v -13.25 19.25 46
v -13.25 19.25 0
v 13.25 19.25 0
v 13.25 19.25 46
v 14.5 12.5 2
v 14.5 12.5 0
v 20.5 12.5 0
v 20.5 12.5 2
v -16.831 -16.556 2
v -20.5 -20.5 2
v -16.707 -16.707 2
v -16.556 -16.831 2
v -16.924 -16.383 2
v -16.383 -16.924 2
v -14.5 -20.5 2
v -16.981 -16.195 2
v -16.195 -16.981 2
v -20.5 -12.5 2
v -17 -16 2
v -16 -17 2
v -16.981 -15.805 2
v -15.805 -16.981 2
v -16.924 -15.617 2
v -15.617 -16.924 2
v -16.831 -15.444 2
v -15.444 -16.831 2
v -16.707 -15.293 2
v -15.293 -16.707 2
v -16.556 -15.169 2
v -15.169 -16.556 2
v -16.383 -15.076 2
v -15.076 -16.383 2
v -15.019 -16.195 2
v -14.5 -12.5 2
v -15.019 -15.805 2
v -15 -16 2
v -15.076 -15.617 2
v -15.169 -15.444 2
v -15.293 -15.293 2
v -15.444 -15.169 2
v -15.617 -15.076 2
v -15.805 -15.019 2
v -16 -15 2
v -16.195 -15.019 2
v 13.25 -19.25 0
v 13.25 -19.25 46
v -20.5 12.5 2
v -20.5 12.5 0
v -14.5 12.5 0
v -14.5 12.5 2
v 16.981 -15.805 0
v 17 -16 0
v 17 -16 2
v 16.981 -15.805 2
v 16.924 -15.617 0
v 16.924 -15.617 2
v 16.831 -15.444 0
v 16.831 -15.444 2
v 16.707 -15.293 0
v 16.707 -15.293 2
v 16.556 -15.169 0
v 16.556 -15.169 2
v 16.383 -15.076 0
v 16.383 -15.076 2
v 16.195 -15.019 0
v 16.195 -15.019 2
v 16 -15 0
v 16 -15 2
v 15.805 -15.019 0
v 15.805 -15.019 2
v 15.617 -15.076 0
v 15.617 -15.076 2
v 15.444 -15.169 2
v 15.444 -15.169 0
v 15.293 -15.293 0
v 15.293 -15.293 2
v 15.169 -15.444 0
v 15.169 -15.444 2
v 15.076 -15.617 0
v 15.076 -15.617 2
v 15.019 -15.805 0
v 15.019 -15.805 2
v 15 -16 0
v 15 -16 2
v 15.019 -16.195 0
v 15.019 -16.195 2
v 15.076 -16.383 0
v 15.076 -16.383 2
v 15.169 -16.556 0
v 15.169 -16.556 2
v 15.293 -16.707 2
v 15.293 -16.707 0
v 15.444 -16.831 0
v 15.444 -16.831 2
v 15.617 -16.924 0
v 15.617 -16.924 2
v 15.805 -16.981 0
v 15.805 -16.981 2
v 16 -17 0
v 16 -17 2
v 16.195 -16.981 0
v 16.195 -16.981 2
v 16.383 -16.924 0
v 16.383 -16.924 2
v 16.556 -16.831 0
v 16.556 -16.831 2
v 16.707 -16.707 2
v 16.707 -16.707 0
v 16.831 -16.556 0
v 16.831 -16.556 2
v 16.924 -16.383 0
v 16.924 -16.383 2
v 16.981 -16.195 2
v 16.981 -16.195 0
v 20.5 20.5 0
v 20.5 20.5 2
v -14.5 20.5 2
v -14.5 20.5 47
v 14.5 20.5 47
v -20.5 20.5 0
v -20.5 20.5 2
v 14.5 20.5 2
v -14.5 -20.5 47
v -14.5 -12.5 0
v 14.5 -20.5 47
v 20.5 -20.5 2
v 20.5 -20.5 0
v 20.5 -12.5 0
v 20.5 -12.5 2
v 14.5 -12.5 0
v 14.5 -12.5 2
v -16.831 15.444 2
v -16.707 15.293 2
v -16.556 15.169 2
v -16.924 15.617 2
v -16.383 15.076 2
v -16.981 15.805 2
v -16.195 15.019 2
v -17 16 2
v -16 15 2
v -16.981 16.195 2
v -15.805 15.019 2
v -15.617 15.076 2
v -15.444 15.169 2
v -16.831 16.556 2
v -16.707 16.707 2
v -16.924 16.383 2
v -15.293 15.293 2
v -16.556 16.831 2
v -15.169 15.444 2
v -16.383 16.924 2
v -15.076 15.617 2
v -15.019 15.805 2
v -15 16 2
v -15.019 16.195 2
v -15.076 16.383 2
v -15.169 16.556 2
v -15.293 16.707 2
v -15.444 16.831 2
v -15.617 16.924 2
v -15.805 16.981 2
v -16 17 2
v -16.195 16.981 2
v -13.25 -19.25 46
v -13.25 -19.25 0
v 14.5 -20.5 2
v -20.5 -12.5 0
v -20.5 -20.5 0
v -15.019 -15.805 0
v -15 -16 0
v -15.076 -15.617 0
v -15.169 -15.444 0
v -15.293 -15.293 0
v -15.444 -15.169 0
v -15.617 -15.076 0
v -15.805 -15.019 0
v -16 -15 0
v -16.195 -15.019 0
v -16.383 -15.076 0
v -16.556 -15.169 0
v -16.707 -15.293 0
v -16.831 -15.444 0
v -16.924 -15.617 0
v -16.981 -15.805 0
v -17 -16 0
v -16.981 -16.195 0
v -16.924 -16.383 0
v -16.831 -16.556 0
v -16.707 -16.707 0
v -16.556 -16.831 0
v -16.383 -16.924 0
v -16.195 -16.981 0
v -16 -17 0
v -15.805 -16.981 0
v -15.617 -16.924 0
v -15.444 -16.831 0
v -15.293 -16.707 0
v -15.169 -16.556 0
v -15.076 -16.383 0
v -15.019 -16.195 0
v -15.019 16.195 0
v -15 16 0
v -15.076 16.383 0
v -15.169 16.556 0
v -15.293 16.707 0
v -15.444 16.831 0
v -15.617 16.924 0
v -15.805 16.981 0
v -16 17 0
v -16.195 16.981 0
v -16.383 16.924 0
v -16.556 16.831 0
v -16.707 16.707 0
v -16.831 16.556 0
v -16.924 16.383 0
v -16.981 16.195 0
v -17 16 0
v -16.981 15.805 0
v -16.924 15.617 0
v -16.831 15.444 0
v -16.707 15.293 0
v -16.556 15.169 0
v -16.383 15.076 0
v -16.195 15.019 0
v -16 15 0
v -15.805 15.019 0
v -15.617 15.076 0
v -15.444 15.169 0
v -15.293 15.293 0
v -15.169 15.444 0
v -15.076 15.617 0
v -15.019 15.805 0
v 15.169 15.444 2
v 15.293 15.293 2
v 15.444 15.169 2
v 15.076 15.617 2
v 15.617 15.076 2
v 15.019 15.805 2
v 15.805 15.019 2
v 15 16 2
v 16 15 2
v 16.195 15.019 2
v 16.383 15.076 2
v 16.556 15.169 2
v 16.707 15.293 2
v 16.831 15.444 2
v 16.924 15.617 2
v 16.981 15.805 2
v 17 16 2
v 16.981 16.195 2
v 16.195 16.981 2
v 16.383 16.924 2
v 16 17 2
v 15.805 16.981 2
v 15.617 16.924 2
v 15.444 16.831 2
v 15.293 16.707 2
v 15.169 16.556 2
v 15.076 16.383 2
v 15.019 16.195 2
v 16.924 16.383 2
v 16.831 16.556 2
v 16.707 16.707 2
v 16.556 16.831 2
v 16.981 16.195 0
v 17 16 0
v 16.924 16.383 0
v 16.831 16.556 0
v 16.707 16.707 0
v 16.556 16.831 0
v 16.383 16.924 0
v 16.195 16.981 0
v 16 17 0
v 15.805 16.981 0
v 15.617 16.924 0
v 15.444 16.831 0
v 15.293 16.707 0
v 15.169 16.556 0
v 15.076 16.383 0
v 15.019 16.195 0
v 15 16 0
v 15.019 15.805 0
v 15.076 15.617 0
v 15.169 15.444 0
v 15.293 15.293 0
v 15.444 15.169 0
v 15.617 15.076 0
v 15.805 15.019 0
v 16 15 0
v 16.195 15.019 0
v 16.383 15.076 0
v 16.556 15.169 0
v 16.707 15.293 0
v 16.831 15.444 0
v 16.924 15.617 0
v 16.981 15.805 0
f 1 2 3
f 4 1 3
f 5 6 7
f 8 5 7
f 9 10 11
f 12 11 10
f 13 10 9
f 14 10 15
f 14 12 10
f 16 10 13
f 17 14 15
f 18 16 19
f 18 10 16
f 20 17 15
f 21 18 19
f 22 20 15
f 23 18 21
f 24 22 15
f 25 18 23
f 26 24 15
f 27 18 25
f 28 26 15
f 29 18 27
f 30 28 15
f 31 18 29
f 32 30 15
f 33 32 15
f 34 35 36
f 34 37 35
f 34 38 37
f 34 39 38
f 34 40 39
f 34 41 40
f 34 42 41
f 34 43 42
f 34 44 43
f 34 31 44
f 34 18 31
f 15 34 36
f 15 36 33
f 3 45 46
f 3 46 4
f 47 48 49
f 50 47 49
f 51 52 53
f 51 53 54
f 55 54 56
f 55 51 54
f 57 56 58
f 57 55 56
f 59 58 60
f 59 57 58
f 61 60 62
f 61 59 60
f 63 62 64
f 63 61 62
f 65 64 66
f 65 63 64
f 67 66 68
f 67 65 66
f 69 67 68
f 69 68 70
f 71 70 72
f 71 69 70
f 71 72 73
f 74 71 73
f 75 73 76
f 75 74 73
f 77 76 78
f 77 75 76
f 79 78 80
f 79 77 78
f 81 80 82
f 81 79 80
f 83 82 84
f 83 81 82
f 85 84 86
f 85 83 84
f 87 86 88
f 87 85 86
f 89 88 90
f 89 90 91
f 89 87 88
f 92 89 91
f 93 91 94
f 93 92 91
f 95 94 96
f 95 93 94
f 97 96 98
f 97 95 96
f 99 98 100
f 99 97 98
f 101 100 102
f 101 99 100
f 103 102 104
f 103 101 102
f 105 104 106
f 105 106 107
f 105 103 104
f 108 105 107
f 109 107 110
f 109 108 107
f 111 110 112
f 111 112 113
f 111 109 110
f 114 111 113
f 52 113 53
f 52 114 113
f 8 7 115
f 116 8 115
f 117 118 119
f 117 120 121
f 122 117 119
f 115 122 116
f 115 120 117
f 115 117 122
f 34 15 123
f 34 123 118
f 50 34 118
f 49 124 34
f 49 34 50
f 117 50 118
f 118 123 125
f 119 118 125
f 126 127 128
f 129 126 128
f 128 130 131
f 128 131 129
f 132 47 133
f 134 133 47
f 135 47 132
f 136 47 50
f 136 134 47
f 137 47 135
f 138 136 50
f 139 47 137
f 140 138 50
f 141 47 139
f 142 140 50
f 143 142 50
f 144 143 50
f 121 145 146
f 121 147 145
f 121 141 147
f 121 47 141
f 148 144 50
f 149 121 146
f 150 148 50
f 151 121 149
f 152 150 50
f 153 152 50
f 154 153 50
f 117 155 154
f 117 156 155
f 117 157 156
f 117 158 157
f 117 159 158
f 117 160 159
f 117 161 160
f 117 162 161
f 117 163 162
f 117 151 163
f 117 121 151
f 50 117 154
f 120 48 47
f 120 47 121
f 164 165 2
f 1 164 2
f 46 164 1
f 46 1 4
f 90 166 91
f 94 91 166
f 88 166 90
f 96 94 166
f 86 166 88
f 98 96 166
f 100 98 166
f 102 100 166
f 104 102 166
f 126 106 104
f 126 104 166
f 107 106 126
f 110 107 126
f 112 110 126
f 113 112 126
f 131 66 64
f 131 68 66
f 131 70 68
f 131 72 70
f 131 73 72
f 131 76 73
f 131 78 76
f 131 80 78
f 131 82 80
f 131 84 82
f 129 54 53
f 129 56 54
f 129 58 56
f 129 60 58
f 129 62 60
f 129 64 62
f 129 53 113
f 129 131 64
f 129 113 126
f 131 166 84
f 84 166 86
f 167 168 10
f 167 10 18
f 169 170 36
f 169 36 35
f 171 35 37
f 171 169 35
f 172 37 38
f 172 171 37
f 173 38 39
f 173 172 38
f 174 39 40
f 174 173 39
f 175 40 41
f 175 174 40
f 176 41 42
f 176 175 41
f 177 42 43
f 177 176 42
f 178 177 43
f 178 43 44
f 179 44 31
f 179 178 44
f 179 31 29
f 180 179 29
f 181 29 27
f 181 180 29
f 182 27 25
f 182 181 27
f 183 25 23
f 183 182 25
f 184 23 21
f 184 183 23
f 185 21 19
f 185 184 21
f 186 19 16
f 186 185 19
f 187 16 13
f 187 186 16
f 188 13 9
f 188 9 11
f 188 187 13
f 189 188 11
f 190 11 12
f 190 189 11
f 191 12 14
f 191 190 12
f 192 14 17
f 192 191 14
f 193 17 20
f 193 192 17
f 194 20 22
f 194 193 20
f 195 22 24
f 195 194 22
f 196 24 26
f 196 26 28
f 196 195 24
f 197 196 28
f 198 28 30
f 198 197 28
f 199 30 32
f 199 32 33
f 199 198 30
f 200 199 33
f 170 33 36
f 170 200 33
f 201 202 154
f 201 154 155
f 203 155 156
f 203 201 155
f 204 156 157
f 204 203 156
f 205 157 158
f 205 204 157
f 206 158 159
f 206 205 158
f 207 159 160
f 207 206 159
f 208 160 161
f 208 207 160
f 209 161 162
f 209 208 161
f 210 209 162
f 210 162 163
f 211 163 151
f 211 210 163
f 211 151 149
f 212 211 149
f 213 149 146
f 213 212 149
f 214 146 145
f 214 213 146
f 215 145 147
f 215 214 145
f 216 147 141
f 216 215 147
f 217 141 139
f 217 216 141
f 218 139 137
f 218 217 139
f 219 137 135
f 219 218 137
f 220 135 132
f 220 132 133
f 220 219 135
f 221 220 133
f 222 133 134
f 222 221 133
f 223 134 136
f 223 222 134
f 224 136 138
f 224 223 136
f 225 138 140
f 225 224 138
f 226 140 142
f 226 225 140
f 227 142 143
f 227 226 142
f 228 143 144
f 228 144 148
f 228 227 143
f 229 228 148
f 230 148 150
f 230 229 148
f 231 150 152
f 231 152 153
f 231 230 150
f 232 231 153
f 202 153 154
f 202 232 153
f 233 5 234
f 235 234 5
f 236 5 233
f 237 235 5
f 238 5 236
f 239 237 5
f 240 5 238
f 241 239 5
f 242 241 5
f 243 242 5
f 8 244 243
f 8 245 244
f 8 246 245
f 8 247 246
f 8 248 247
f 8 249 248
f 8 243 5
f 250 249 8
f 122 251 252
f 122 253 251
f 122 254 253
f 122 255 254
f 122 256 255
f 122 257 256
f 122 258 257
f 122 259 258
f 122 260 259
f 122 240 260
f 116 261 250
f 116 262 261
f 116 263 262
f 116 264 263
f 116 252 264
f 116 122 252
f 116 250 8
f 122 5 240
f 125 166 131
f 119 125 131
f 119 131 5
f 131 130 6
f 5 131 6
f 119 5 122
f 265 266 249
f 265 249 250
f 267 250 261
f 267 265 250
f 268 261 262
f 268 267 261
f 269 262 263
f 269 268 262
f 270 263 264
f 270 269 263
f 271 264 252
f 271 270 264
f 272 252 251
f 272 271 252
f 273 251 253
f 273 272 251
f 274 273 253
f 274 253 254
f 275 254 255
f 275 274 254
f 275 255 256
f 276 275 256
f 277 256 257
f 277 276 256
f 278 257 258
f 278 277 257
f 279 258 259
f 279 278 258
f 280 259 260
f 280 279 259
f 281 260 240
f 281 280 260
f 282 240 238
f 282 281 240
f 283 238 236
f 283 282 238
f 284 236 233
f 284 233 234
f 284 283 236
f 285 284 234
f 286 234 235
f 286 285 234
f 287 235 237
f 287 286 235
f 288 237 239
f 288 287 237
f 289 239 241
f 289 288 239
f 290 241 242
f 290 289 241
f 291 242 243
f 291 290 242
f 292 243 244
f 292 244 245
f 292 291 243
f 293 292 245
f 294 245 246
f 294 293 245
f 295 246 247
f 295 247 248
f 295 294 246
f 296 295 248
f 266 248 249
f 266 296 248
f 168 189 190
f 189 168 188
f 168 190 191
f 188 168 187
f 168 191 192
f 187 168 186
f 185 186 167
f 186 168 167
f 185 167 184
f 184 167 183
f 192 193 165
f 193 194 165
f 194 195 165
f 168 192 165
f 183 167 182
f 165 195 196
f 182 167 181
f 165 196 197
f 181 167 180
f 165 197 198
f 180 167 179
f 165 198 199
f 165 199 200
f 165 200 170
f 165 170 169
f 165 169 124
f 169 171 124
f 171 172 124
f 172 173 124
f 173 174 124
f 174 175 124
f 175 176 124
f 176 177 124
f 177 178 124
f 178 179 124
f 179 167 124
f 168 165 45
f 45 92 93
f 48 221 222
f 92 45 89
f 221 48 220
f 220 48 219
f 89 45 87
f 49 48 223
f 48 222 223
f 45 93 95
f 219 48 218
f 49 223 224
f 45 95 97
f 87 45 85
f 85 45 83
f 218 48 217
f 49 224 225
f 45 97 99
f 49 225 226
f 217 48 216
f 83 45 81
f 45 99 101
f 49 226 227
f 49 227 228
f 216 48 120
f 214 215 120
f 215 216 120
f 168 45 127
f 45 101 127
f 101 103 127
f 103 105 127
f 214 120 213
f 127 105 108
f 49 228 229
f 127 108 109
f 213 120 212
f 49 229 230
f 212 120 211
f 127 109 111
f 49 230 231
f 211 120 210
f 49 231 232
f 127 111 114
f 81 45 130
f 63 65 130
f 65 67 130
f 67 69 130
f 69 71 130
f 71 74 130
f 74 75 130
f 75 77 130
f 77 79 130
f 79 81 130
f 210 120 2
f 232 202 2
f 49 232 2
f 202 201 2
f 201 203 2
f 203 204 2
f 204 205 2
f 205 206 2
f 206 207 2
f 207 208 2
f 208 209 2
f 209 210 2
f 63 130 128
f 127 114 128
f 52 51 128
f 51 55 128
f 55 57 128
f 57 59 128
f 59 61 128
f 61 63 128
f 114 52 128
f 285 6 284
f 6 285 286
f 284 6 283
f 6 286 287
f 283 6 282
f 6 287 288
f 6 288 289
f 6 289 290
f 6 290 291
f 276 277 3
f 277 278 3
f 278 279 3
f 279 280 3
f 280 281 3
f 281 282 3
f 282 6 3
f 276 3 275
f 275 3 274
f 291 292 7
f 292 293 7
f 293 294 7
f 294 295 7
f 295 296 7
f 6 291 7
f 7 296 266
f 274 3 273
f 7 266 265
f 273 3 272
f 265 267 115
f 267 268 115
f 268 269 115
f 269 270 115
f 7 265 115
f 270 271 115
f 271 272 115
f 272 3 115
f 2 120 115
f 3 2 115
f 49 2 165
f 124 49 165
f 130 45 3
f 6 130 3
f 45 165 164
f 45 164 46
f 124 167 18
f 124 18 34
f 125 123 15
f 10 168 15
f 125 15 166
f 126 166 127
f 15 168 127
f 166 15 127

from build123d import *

# Parameters (mm, degrees)
SKETCH_1_W          = 29
SKETCH_1_H          = 41
EXTRUDE_1_DEPTH     = 47
SKETCH_2_W          = 26.5
SKETCH_2_H          = 38.5
CUT_EXTRUDE_1_DEPTH = 46
SKETCH_4_W          = 6
SKETCH_4_H          = 8
EXTRUDE_2_DEPTH     = 2
SKETCH_5_R          = 1
CUT_EXTRUDE_4_DEPTH = 2


with BuildPart() as part:
    # ｽｹｯﾁ1 → ﾎﾞｽ - 押し出し1 (new body)
    with BuildSketch(Plane.XY):
        Rectangle(SKETCH_1_W, SKETCH_1_H)
    extrude(amount=EXTRUDE_1_DEPTH)

    # ｽｹｯﾁ2 → ｶｯﾄ - 押し出し1 (cut)
    with BuildSketch(Plane.XY):
        Rectangle(SKETCH_2_W, SKETCH_2_H)
    extrude(amount=CUT_EXTRUDE_1_DEPTH, mode=Mode.SUBTRACT)

    # ｽｹｯﾁ4 → ﾎﾞｽ - 押し出し2 (add)
    with BuildSketch(Plane.XY):
        with Locations((17.5, 16.5)):
            Rectangle(SKETCH_4_W, SKETCH_4_H)
        with Locations((17.5, -16.5)):
            Rectangle(SKETCH_4_W, SKETCH_4_H)
        with Locations((-17.5, -16.5)):
            Rectangle(SKETCH_4_W, SKETCH_4_H)
        with Locations((-17.5, 16.5)):
            Rectangle(SKETCH_4_W, SKETCH_4_H)
    extrude(amount=EXTRUDE_2_DEPTH)

    # ｽｹｯﾁ5 → ｶｯﾄ - 押し出し4 (cut)
    with BuildSketch(Plane.XY):
        with Locations((-16, 16)):
            Circle(SKETCH_5_R)
        with Locations((-16, -16)):
            Circle(SKETCH_5_R)
        with Locations((16, -16)):
            Circle(SKETCH_5_R)
        with Locations((16, 16)):
            Circle(SKETCH_5_R)
    extrude(amount=CUT_EXTRUDE_4_DEPTH, mode=Mode.SUBTRACT)


solid = part.part
